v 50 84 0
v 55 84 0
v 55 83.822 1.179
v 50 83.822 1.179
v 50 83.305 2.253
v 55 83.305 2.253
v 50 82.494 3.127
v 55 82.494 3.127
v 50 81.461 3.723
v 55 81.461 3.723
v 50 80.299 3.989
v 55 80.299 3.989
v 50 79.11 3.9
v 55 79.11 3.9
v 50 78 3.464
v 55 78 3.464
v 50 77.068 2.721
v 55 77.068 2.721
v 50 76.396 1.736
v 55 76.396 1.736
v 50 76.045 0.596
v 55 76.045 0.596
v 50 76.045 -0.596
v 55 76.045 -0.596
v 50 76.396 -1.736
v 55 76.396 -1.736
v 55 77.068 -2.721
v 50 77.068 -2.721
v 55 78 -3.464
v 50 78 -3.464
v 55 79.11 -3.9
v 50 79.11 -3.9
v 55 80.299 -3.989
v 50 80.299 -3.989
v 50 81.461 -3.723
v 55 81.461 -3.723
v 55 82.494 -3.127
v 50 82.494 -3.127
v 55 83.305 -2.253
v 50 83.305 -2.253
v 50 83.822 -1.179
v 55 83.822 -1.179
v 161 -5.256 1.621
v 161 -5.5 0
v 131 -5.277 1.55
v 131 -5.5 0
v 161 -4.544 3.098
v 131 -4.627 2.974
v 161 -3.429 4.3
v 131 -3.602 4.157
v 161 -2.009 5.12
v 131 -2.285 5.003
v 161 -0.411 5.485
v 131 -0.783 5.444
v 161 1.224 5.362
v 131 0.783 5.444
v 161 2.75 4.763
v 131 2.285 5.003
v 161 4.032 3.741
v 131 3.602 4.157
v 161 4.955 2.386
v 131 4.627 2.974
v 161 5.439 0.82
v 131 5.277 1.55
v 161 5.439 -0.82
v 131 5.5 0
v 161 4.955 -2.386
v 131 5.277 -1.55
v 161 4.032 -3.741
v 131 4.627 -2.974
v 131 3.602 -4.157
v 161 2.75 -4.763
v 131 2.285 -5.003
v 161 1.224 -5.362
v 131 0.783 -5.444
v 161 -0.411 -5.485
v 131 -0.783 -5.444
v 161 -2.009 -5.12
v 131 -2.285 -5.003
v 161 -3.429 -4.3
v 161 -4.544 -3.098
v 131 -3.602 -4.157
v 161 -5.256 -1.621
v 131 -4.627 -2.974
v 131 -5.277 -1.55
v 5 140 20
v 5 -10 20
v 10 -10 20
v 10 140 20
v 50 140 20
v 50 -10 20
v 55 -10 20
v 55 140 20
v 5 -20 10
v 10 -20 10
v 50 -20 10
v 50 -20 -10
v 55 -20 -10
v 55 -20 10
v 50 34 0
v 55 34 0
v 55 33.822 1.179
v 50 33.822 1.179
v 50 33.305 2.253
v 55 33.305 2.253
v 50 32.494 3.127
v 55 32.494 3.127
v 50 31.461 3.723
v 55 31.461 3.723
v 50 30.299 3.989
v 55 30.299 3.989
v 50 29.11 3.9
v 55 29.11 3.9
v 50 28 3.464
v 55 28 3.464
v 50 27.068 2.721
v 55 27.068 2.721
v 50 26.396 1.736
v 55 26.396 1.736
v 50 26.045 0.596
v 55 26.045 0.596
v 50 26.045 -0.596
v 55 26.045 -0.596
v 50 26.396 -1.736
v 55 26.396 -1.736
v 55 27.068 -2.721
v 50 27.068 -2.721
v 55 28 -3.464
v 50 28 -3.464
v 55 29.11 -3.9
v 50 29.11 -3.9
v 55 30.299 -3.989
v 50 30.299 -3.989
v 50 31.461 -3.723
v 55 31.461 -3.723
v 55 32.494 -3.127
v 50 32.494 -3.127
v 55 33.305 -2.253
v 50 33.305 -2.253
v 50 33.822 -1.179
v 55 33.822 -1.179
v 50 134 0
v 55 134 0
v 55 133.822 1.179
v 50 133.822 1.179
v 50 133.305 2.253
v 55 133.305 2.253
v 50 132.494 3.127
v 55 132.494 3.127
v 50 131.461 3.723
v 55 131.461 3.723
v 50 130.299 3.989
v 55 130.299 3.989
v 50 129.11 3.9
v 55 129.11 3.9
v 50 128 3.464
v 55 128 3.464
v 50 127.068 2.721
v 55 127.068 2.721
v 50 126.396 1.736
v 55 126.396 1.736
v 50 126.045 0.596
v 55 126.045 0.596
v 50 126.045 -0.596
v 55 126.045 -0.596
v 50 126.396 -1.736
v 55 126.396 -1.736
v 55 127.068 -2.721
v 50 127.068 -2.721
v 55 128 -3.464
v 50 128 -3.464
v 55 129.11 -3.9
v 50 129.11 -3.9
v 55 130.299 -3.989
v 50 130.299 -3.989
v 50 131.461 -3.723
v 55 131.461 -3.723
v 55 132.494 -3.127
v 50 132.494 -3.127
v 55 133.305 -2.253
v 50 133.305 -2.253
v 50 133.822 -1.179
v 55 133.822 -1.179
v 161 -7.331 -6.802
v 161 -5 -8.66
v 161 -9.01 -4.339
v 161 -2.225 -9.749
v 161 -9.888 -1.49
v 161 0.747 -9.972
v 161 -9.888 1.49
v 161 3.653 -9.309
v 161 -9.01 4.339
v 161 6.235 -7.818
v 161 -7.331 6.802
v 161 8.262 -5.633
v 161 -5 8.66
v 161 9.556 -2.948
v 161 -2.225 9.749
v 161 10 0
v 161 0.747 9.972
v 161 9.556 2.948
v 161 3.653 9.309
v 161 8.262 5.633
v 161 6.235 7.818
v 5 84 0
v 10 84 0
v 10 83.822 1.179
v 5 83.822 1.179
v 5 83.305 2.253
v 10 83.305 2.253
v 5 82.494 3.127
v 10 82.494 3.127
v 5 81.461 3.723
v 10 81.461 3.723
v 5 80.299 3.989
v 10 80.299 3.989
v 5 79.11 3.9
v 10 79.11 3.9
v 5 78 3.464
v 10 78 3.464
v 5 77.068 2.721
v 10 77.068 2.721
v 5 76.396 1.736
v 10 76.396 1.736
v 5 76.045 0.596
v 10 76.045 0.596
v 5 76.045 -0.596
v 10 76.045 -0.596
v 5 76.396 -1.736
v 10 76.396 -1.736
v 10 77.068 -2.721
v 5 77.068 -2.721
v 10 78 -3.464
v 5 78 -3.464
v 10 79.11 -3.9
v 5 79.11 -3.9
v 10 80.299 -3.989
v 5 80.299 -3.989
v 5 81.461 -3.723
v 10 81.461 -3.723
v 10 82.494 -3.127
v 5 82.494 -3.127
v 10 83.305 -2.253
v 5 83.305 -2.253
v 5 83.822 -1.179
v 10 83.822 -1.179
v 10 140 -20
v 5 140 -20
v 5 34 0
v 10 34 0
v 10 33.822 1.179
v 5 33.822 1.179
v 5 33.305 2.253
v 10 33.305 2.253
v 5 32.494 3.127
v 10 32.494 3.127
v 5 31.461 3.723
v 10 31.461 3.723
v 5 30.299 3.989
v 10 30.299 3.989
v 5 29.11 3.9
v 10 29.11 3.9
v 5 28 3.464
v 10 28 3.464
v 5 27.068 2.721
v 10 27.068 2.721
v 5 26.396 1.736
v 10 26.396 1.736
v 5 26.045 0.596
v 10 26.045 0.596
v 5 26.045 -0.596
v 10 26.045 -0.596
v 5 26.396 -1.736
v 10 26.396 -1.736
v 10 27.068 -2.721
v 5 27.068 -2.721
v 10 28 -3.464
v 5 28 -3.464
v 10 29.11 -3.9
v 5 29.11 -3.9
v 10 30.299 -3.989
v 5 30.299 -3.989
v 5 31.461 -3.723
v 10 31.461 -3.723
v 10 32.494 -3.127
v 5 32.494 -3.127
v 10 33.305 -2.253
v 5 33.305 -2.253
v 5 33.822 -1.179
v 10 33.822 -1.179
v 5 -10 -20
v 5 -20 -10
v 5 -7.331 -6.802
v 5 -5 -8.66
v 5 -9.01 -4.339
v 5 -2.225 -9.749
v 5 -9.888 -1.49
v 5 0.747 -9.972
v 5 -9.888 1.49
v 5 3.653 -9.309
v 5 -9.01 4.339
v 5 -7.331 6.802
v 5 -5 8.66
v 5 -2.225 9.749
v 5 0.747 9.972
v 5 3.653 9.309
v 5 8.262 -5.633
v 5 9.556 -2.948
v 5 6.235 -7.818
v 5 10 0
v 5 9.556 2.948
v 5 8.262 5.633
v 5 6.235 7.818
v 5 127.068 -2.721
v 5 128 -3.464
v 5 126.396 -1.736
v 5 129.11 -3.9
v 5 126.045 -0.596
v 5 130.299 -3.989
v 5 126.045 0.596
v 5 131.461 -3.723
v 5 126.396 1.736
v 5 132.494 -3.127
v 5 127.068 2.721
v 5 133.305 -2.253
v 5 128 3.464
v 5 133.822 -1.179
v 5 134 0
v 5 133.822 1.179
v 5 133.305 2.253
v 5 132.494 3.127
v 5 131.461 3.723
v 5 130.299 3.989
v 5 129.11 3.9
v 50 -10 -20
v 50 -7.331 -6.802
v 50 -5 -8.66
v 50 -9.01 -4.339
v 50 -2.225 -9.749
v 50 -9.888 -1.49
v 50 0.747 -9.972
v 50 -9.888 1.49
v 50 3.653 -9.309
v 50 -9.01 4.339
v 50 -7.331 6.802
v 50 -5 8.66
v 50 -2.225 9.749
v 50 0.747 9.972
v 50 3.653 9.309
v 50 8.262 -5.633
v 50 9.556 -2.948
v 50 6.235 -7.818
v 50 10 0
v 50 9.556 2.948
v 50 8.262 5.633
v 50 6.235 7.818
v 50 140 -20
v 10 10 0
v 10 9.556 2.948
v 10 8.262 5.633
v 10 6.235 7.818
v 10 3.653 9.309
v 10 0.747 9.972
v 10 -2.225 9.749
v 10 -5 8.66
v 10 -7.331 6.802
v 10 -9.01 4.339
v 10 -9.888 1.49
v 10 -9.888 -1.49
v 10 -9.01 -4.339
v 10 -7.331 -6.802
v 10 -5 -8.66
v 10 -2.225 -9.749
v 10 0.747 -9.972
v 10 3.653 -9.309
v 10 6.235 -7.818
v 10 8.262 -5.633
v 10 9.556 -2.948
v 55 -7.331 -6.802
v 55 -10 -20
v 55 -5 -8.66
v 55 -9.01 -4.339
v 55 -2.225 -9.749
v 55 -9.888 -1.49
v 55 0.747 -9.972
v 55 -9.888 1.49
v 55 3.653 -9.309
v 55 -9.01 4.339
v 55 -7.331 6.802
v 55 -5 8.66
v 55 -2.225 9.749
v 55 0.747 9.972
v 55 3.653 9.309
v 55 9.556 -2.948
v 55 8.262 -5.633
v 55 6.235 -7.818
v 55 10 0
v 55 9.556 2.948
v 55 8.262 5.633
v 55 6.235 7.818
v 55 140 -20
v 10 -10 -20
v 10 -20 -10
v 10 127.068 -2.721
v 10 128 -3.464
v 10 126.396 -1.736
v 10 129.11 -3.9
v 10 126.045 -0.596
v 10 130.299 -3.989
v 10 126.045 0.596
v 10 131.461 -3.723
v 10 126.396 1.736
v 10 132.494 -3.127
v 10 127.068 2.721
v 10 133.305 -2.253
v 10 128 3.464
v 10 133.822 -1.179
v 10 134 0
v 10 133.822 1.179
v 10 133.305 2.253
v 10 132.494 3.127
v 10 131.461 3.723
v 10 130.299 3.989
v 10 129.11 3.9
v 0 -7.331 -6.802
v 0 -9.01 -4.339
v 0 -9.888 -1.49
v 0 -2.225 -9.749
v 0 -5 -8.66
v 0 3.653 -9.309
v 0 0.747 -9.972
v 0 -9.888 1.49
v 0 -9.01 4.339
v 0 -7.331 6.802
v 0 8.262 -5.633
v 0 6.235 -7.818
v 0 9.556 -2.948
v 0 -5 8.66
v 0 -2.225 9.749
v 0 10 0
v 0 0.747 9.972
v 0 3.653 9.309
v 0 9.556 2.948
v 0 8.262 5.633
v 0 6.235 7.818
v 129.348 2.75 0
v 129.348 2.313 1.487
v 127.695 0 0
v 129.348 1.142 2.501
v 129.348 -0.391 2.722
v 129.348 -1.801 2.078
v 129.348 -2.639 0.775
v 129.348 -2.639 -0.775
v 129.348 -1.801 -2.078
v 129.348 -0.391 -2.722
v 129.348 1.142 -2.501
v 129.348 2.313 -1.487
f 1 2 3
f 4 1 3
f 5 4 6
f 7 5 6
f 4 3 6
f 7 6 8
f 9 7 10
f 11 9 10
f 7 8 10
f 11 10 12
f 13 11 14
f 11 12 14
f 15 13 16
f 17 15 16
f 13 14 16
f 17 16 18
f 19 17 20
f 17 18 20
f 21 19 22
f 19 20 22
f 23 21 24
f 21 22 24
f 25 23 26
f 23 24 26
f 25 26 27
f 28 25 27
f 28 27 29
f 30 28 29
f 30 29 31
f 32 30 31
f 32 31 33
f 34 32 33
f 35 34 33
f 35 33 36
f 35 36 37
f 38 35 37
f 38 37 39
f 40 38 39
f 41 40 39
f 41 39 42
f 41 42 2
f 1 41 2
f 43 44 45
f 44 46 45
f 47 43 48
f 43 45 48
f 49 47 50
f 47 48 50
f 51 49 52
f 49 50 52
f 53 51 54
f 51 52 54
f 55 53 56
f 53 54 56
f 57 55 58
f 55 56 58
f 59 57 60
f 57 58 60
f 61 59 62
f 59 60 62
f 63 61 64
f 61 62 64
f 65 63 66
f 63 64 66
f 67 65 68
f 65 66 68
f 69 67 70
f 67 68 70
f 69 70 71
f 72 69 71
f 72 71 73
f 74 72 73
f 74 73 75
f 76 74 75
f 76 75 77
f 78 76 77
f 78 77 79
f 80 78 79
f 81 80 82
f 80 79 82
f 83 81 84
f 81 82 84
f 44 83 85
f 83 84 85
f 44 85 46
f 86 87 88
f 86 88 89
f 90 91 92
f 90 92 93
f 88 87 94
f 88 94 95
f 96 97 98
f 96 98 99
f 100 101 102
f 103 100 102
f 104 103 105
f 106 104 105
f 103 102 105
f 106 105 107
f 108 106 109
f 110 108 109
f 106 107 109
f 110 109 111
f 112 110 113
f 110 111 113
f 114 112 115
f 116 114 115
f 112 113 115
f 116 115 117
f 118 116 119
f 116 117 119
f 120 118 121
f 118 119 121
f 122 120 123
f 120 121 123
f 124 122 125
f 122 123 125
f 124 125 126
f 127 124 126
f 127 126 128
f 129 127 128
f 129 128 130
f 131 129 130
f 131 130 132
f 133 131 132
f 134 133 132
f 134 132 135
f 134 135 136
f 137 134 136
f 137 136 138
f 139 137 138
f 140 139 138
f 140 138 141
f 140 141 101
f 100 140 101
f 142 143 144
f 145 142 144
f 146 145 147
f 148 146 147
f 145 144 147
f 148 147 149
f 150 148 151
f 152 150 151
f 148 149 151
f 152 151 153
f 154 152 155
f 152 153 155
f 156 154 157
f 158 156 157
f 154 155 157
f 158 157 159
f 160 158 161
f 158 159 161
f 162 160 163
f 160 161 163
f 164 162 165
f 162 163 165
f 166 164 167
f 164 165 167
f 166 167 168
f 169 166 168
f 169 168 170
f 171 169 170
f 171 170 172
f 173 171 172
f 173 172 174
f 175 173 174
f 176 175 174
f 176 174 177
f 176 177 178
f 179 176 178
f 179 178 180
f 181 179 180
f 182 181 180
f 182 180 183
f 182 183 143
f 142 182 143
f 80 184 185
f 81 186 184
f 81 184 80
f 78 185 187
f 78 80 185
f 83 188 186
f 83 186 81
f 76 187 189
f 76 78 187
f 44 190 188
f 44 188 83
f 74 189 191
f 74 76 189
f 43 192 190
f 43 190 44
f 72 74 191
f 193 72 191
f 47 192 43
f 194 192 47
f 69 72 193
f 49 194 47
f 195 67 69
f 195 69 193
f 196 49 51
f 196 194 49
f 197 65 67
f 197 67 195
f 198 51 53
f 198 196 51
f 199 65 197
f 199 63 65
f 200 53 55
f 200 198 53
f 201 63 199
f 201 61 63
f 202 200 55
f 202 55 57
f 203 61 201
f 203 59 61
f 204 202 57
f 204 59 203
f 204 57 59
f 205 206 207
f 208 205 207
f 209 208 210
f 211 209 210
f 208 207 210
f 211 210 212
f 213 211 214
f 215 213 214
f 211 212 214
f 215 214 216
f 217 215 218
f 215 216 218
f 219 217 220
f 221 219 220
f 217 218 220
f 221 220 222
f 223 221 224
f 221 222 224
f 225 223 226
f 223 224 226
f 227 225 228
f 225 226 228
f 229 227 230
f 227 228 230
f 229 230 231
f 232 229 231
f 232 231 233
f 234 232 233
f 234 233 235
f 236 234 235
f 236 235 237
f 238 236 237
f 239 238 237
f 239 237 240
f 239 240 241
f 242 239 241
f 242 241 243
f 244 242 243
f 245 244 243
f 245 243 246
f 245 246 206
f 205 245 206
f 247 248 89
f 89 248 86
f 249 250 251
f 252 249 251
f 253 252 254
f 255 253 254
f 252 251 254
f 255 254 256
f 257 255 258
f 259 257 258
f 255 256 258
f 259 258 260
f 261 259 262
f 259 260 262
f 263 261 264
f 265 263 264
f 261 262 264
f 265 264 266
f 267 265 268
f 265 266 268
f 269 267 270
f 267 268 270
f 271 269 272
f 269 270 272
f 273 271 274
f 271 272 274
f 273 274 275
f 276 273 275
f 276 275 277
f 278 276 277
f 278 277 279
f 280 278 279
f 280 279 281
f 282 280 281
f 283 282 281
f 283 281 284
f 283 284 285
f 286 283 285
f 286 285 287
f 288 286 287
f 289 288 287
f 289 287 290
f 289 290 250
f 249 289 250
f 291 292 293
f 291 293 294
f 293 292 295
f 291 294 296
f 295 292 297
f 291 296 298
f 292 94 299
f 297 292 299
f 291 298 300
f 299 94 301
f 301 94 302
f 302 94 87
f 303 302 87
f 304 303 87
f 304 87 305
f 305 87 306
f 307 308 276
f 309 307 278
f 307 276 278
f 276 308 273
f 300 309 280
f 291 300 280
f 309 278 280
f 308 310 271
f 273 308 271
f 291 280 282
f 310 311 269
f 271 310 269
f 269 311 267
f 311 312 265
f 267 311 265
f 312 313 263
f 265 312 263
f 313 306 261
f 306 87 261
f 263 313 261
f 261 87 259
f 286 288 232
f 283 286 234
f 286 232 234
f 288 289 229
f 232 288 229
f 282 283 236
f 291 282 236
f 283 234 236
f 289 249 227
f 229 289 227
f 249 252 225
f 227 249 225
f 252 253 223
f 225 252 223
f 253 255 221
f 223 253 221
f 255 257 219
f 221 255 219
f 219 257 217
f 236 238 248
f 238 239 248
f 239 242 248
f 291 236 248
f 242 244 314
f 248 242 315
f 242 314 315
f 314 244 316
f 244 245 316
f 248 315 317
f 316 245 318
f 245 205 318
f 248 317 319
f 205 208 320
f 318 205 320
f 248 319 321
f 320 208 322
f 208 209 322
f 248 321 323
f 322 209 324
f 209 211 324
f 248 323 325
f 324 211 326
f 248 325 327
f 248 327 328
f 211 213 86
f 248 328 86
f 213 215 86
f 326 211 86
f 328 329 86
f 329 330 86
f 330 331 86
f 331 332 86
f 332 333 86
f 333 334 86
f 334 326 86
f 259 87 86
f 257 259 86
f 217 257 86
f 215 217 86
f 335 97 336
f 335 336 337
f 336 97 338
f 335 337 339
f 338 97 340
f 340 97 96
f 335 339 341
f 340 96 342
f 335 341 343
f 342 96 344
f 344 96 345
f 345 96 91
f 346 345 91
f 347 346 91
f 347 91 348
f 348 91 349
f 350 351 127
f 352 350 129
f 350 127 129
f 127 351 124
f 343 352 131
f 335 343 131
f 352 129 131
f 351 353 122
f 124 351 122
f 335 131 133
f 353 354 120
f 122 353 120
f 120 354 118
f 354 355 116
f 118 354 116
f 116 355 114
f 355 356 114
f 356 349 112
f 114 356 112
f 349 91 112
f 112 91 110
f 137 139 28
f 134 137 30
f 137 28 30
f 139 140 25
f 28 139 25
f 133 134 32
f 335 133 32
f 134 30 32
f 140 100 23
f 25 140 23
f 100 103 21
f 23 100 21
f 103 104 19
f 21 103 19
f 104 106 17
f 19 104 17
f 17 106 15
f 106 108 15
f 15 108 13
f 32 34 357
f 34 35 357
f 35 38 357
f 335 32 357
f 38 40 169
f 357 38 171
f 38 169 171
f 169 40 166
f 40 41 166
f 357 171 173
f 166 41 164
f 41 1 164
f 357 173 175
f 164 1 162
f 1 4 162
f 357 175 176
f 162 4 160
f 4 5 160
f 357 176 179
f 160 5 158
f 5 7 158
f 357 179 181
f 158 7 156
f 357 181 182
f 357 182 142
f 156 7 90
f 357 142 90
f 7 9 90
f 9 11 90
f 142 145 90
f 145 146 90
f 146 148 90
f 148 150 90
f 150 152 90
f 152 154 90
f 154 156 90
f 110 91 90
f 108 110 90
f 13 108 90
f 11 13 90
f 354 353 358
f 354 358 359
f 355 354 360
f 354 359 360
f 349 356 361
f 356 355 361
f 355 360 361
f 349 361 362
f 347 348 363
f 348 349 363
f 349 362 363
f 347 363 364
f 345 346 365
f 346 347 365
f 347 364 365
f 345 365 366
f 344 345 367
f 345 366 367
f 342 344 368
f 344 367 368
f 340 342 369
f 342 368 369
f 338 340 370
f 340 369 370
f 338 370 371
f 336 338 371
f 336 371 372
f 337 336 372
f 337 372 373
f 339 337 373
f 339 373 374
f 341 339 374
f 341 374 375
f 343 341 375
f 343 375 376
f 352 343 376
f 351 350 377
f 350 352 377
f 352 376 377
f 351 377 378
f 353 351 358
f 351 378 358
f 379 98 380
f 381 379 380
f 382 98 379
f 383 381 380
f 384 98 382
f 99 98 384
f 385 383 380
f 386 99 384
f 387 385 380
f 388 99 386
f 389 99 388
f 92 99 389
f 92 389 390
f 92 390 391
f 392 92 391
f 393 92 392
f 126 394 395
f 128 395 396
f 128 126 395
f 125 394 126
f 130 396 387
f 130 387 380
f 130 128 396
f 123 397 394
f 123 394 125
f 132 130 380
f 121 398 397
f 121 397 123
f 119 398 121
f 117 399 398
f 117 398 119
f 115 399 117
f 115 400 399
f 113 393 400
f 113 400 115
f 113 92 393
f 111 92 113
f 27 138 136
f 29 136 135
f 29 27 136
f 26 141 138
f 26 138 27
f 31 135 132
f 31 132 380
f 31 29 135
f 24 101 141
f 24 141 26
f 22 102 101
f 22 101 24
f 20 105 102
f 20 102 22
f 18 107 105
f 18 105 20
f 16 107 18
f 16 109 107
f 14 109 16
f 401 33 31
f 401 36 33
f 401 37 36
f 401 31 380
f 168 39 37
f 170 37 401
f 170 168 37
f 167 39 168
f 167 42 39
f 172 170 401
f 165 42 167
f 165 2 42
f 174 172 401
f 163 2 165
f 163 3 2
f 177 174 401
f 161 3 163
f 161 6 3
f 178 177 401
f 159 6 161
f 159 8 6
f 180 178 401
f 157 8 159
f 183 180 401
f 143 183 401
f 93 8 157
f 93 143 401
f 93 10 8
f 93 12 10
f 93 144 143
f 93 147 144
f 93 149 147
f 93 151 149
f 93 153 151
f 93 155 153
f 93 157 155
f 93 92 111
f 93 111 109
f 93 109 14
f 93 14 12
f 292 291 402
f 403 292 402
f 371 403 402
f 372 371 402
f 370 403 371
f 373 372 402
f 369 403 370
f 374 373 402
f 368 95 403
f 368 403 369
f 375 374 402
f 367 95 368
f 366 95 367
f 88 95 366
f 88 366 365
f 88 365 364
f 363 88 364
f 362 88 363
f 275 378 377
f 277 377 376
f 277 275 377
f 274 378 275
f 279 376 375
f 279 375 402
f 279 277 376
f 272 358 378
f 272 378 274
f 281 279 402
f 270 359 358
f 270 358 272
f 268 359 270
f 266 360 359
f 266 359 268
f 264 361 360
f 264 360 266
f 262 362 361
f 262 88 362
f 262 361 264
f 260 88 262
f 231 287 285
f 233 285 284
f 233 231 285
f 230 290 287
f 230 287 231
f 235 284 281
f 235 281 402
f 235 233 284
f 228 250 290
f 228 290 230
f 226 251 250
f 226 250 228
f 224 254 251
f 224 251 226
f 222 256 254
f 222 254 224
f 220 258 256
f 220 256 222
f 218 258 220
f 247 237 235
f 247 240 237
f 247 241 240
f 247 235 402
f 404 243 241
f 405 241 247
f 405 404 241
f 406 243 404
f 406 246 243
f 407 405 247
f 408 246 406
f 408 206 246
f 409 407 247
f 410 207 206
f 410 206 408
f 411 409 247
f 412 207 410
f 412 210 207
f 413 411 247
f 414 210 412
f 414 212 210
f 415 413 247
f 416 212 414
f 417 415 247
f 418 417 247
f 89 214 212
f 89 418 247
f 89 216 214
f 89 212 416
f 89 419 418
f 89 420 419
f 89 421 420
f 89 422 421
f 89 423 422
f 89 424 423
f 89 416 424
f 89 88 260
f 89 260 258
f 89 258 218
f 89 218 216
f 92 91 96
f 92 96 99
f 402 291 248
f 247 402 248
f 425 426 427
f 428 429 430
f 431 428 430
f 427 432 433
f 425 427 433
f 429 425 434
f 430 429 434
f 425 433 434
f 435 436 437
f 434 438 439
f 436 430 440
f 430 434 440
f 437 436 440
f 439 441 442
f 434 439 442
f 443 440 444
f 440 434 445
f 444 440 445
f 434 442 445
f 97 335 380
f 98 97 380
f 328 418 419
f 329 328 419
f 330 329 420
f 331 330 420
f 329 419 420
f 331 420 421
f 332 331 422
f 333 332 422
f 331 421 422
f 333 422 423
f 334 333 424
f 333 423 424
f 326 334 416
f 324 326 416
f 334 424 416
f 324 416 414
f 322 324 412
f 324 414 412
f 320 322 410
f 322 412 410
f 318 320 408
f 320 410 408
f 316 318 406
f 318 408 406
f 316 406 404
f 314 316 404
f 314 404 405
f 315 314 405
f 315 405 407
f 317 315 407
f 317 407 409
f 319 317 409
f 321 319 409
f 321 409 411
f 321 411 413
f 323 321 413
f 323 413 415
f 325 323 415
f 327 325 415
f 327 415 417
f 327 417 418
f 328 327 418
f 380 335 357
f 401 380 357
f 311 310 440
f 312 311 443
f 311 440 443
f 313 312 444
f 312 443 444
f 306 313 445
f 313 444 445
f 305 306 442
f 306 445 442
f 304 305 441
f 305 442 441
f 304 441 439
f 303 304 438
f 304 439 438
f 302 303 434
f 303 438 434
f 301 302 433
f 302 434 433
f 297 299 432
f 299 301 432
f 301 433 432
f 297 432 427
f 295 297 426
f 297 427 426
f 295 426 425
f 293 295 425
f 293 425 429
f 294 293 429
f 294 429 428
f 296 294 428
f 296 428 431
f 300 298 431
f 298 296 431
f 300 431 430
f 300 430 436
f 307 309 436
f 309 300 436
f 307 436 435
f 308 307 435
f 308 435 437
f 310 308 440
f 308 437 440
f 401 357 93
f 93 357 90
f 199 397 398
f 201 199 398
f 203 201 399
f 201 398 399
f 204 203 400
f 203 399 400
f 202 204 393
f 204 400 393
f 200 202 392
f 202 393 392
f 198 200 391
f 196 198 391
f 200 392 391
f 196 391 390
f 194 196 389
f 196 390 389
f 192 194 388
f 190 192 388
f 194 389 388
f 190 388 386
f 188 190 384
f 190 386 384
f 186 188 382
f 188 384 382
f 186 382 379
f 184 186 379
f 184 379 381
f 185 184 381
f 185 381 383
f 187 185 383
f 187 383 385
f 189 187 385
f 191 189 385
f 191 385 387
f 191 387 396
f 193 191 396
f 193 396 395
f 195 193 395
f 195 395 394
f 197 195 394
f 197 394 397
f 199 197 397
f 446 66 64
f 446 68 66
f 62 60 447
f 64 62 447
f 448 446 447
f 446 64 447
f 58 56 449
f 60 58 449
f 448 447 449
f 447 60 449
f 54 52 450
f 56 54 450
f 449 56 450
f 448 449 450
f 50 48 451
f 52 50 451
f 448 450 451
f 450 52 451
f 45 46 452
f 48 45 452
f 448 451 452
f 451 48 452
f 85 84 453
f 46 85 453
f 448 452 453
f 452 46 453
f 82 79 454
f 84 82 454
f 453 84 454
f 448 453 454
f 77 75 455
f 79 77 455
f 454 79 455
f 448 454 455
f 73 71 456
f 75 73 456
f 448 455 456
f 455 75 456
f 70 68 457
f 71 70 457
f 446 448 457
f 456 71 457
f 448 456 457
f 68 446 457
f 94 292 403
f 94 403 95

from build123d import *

# Parameters (mm, degrees)
F0_R      = 10
F1_DEPTH  = 161
F3_W      = 160
F3_H      = 40
F4_DEPTH  = 5
F6_W      = 160
F6_H      = 40
F7_DEPTH  = 5
F8_SIZE   = 10
F10_D     = 8
F12_D     = 11
F12_DEPTH = 30
F12_TIP   = 3.3047334047


with BuildPart() as f1:
    # F0 (on Right) → F1 (new body)
    with BuildSketch(Plane.YZ):
        Circle(F0_R)
    extrude(amount=F1_DEPTH)

    # F3 (on offset) → F4 (join)
    with BuildSketch(Plane.YZ.offset(5)):
        with Locations((60, 0)):
            Rectangle(F3_W, F3_H)
    extrude(amount=F4_DEPTH)

    # F6 (on offset) → F7 (join)
    with BuildSketch(Plane.YZ.offset(50)):
        with Locations((60, -9.313e-07)):
            Rectangle(F6_W, F6_H)
    extrude(amount=F7_DEPTH)

    # F8
    f8_edges = [f1.edges().sort_by_distance(p)[0] for p in [
        (52.5, -20, 19.999999),
        (7.5, -20, 20),
        (7.5, -20, -20),
        (52.5, -20, -20.000001),
    ]]
    chamfer(f8_edges, length=F8_SIZE)

    # F10 (through all)
    with Locations(Plane(origin=(5, 0, 0), x_dir=(0, -1, 0), z_dir=(-1, 0, 0))):
        with Locations((-130, 0), (-80, 0), (-30, 0)):
            Hole(F10_D / 2)

    # F12
    with Locations(Plane.YZ.offset(161)):
        with Locations((0, 0)):
            Hole(F12_D / 2, depth=F12_DEPTH)
            with Locations((0, 0, -(F12_DEPTH + F12_TIP / 2))):  # 118° drill point
                Cone(0, F12_D / 2, F12_TIP, mode=Mode.SUBTRACT)


solid = f1.part
